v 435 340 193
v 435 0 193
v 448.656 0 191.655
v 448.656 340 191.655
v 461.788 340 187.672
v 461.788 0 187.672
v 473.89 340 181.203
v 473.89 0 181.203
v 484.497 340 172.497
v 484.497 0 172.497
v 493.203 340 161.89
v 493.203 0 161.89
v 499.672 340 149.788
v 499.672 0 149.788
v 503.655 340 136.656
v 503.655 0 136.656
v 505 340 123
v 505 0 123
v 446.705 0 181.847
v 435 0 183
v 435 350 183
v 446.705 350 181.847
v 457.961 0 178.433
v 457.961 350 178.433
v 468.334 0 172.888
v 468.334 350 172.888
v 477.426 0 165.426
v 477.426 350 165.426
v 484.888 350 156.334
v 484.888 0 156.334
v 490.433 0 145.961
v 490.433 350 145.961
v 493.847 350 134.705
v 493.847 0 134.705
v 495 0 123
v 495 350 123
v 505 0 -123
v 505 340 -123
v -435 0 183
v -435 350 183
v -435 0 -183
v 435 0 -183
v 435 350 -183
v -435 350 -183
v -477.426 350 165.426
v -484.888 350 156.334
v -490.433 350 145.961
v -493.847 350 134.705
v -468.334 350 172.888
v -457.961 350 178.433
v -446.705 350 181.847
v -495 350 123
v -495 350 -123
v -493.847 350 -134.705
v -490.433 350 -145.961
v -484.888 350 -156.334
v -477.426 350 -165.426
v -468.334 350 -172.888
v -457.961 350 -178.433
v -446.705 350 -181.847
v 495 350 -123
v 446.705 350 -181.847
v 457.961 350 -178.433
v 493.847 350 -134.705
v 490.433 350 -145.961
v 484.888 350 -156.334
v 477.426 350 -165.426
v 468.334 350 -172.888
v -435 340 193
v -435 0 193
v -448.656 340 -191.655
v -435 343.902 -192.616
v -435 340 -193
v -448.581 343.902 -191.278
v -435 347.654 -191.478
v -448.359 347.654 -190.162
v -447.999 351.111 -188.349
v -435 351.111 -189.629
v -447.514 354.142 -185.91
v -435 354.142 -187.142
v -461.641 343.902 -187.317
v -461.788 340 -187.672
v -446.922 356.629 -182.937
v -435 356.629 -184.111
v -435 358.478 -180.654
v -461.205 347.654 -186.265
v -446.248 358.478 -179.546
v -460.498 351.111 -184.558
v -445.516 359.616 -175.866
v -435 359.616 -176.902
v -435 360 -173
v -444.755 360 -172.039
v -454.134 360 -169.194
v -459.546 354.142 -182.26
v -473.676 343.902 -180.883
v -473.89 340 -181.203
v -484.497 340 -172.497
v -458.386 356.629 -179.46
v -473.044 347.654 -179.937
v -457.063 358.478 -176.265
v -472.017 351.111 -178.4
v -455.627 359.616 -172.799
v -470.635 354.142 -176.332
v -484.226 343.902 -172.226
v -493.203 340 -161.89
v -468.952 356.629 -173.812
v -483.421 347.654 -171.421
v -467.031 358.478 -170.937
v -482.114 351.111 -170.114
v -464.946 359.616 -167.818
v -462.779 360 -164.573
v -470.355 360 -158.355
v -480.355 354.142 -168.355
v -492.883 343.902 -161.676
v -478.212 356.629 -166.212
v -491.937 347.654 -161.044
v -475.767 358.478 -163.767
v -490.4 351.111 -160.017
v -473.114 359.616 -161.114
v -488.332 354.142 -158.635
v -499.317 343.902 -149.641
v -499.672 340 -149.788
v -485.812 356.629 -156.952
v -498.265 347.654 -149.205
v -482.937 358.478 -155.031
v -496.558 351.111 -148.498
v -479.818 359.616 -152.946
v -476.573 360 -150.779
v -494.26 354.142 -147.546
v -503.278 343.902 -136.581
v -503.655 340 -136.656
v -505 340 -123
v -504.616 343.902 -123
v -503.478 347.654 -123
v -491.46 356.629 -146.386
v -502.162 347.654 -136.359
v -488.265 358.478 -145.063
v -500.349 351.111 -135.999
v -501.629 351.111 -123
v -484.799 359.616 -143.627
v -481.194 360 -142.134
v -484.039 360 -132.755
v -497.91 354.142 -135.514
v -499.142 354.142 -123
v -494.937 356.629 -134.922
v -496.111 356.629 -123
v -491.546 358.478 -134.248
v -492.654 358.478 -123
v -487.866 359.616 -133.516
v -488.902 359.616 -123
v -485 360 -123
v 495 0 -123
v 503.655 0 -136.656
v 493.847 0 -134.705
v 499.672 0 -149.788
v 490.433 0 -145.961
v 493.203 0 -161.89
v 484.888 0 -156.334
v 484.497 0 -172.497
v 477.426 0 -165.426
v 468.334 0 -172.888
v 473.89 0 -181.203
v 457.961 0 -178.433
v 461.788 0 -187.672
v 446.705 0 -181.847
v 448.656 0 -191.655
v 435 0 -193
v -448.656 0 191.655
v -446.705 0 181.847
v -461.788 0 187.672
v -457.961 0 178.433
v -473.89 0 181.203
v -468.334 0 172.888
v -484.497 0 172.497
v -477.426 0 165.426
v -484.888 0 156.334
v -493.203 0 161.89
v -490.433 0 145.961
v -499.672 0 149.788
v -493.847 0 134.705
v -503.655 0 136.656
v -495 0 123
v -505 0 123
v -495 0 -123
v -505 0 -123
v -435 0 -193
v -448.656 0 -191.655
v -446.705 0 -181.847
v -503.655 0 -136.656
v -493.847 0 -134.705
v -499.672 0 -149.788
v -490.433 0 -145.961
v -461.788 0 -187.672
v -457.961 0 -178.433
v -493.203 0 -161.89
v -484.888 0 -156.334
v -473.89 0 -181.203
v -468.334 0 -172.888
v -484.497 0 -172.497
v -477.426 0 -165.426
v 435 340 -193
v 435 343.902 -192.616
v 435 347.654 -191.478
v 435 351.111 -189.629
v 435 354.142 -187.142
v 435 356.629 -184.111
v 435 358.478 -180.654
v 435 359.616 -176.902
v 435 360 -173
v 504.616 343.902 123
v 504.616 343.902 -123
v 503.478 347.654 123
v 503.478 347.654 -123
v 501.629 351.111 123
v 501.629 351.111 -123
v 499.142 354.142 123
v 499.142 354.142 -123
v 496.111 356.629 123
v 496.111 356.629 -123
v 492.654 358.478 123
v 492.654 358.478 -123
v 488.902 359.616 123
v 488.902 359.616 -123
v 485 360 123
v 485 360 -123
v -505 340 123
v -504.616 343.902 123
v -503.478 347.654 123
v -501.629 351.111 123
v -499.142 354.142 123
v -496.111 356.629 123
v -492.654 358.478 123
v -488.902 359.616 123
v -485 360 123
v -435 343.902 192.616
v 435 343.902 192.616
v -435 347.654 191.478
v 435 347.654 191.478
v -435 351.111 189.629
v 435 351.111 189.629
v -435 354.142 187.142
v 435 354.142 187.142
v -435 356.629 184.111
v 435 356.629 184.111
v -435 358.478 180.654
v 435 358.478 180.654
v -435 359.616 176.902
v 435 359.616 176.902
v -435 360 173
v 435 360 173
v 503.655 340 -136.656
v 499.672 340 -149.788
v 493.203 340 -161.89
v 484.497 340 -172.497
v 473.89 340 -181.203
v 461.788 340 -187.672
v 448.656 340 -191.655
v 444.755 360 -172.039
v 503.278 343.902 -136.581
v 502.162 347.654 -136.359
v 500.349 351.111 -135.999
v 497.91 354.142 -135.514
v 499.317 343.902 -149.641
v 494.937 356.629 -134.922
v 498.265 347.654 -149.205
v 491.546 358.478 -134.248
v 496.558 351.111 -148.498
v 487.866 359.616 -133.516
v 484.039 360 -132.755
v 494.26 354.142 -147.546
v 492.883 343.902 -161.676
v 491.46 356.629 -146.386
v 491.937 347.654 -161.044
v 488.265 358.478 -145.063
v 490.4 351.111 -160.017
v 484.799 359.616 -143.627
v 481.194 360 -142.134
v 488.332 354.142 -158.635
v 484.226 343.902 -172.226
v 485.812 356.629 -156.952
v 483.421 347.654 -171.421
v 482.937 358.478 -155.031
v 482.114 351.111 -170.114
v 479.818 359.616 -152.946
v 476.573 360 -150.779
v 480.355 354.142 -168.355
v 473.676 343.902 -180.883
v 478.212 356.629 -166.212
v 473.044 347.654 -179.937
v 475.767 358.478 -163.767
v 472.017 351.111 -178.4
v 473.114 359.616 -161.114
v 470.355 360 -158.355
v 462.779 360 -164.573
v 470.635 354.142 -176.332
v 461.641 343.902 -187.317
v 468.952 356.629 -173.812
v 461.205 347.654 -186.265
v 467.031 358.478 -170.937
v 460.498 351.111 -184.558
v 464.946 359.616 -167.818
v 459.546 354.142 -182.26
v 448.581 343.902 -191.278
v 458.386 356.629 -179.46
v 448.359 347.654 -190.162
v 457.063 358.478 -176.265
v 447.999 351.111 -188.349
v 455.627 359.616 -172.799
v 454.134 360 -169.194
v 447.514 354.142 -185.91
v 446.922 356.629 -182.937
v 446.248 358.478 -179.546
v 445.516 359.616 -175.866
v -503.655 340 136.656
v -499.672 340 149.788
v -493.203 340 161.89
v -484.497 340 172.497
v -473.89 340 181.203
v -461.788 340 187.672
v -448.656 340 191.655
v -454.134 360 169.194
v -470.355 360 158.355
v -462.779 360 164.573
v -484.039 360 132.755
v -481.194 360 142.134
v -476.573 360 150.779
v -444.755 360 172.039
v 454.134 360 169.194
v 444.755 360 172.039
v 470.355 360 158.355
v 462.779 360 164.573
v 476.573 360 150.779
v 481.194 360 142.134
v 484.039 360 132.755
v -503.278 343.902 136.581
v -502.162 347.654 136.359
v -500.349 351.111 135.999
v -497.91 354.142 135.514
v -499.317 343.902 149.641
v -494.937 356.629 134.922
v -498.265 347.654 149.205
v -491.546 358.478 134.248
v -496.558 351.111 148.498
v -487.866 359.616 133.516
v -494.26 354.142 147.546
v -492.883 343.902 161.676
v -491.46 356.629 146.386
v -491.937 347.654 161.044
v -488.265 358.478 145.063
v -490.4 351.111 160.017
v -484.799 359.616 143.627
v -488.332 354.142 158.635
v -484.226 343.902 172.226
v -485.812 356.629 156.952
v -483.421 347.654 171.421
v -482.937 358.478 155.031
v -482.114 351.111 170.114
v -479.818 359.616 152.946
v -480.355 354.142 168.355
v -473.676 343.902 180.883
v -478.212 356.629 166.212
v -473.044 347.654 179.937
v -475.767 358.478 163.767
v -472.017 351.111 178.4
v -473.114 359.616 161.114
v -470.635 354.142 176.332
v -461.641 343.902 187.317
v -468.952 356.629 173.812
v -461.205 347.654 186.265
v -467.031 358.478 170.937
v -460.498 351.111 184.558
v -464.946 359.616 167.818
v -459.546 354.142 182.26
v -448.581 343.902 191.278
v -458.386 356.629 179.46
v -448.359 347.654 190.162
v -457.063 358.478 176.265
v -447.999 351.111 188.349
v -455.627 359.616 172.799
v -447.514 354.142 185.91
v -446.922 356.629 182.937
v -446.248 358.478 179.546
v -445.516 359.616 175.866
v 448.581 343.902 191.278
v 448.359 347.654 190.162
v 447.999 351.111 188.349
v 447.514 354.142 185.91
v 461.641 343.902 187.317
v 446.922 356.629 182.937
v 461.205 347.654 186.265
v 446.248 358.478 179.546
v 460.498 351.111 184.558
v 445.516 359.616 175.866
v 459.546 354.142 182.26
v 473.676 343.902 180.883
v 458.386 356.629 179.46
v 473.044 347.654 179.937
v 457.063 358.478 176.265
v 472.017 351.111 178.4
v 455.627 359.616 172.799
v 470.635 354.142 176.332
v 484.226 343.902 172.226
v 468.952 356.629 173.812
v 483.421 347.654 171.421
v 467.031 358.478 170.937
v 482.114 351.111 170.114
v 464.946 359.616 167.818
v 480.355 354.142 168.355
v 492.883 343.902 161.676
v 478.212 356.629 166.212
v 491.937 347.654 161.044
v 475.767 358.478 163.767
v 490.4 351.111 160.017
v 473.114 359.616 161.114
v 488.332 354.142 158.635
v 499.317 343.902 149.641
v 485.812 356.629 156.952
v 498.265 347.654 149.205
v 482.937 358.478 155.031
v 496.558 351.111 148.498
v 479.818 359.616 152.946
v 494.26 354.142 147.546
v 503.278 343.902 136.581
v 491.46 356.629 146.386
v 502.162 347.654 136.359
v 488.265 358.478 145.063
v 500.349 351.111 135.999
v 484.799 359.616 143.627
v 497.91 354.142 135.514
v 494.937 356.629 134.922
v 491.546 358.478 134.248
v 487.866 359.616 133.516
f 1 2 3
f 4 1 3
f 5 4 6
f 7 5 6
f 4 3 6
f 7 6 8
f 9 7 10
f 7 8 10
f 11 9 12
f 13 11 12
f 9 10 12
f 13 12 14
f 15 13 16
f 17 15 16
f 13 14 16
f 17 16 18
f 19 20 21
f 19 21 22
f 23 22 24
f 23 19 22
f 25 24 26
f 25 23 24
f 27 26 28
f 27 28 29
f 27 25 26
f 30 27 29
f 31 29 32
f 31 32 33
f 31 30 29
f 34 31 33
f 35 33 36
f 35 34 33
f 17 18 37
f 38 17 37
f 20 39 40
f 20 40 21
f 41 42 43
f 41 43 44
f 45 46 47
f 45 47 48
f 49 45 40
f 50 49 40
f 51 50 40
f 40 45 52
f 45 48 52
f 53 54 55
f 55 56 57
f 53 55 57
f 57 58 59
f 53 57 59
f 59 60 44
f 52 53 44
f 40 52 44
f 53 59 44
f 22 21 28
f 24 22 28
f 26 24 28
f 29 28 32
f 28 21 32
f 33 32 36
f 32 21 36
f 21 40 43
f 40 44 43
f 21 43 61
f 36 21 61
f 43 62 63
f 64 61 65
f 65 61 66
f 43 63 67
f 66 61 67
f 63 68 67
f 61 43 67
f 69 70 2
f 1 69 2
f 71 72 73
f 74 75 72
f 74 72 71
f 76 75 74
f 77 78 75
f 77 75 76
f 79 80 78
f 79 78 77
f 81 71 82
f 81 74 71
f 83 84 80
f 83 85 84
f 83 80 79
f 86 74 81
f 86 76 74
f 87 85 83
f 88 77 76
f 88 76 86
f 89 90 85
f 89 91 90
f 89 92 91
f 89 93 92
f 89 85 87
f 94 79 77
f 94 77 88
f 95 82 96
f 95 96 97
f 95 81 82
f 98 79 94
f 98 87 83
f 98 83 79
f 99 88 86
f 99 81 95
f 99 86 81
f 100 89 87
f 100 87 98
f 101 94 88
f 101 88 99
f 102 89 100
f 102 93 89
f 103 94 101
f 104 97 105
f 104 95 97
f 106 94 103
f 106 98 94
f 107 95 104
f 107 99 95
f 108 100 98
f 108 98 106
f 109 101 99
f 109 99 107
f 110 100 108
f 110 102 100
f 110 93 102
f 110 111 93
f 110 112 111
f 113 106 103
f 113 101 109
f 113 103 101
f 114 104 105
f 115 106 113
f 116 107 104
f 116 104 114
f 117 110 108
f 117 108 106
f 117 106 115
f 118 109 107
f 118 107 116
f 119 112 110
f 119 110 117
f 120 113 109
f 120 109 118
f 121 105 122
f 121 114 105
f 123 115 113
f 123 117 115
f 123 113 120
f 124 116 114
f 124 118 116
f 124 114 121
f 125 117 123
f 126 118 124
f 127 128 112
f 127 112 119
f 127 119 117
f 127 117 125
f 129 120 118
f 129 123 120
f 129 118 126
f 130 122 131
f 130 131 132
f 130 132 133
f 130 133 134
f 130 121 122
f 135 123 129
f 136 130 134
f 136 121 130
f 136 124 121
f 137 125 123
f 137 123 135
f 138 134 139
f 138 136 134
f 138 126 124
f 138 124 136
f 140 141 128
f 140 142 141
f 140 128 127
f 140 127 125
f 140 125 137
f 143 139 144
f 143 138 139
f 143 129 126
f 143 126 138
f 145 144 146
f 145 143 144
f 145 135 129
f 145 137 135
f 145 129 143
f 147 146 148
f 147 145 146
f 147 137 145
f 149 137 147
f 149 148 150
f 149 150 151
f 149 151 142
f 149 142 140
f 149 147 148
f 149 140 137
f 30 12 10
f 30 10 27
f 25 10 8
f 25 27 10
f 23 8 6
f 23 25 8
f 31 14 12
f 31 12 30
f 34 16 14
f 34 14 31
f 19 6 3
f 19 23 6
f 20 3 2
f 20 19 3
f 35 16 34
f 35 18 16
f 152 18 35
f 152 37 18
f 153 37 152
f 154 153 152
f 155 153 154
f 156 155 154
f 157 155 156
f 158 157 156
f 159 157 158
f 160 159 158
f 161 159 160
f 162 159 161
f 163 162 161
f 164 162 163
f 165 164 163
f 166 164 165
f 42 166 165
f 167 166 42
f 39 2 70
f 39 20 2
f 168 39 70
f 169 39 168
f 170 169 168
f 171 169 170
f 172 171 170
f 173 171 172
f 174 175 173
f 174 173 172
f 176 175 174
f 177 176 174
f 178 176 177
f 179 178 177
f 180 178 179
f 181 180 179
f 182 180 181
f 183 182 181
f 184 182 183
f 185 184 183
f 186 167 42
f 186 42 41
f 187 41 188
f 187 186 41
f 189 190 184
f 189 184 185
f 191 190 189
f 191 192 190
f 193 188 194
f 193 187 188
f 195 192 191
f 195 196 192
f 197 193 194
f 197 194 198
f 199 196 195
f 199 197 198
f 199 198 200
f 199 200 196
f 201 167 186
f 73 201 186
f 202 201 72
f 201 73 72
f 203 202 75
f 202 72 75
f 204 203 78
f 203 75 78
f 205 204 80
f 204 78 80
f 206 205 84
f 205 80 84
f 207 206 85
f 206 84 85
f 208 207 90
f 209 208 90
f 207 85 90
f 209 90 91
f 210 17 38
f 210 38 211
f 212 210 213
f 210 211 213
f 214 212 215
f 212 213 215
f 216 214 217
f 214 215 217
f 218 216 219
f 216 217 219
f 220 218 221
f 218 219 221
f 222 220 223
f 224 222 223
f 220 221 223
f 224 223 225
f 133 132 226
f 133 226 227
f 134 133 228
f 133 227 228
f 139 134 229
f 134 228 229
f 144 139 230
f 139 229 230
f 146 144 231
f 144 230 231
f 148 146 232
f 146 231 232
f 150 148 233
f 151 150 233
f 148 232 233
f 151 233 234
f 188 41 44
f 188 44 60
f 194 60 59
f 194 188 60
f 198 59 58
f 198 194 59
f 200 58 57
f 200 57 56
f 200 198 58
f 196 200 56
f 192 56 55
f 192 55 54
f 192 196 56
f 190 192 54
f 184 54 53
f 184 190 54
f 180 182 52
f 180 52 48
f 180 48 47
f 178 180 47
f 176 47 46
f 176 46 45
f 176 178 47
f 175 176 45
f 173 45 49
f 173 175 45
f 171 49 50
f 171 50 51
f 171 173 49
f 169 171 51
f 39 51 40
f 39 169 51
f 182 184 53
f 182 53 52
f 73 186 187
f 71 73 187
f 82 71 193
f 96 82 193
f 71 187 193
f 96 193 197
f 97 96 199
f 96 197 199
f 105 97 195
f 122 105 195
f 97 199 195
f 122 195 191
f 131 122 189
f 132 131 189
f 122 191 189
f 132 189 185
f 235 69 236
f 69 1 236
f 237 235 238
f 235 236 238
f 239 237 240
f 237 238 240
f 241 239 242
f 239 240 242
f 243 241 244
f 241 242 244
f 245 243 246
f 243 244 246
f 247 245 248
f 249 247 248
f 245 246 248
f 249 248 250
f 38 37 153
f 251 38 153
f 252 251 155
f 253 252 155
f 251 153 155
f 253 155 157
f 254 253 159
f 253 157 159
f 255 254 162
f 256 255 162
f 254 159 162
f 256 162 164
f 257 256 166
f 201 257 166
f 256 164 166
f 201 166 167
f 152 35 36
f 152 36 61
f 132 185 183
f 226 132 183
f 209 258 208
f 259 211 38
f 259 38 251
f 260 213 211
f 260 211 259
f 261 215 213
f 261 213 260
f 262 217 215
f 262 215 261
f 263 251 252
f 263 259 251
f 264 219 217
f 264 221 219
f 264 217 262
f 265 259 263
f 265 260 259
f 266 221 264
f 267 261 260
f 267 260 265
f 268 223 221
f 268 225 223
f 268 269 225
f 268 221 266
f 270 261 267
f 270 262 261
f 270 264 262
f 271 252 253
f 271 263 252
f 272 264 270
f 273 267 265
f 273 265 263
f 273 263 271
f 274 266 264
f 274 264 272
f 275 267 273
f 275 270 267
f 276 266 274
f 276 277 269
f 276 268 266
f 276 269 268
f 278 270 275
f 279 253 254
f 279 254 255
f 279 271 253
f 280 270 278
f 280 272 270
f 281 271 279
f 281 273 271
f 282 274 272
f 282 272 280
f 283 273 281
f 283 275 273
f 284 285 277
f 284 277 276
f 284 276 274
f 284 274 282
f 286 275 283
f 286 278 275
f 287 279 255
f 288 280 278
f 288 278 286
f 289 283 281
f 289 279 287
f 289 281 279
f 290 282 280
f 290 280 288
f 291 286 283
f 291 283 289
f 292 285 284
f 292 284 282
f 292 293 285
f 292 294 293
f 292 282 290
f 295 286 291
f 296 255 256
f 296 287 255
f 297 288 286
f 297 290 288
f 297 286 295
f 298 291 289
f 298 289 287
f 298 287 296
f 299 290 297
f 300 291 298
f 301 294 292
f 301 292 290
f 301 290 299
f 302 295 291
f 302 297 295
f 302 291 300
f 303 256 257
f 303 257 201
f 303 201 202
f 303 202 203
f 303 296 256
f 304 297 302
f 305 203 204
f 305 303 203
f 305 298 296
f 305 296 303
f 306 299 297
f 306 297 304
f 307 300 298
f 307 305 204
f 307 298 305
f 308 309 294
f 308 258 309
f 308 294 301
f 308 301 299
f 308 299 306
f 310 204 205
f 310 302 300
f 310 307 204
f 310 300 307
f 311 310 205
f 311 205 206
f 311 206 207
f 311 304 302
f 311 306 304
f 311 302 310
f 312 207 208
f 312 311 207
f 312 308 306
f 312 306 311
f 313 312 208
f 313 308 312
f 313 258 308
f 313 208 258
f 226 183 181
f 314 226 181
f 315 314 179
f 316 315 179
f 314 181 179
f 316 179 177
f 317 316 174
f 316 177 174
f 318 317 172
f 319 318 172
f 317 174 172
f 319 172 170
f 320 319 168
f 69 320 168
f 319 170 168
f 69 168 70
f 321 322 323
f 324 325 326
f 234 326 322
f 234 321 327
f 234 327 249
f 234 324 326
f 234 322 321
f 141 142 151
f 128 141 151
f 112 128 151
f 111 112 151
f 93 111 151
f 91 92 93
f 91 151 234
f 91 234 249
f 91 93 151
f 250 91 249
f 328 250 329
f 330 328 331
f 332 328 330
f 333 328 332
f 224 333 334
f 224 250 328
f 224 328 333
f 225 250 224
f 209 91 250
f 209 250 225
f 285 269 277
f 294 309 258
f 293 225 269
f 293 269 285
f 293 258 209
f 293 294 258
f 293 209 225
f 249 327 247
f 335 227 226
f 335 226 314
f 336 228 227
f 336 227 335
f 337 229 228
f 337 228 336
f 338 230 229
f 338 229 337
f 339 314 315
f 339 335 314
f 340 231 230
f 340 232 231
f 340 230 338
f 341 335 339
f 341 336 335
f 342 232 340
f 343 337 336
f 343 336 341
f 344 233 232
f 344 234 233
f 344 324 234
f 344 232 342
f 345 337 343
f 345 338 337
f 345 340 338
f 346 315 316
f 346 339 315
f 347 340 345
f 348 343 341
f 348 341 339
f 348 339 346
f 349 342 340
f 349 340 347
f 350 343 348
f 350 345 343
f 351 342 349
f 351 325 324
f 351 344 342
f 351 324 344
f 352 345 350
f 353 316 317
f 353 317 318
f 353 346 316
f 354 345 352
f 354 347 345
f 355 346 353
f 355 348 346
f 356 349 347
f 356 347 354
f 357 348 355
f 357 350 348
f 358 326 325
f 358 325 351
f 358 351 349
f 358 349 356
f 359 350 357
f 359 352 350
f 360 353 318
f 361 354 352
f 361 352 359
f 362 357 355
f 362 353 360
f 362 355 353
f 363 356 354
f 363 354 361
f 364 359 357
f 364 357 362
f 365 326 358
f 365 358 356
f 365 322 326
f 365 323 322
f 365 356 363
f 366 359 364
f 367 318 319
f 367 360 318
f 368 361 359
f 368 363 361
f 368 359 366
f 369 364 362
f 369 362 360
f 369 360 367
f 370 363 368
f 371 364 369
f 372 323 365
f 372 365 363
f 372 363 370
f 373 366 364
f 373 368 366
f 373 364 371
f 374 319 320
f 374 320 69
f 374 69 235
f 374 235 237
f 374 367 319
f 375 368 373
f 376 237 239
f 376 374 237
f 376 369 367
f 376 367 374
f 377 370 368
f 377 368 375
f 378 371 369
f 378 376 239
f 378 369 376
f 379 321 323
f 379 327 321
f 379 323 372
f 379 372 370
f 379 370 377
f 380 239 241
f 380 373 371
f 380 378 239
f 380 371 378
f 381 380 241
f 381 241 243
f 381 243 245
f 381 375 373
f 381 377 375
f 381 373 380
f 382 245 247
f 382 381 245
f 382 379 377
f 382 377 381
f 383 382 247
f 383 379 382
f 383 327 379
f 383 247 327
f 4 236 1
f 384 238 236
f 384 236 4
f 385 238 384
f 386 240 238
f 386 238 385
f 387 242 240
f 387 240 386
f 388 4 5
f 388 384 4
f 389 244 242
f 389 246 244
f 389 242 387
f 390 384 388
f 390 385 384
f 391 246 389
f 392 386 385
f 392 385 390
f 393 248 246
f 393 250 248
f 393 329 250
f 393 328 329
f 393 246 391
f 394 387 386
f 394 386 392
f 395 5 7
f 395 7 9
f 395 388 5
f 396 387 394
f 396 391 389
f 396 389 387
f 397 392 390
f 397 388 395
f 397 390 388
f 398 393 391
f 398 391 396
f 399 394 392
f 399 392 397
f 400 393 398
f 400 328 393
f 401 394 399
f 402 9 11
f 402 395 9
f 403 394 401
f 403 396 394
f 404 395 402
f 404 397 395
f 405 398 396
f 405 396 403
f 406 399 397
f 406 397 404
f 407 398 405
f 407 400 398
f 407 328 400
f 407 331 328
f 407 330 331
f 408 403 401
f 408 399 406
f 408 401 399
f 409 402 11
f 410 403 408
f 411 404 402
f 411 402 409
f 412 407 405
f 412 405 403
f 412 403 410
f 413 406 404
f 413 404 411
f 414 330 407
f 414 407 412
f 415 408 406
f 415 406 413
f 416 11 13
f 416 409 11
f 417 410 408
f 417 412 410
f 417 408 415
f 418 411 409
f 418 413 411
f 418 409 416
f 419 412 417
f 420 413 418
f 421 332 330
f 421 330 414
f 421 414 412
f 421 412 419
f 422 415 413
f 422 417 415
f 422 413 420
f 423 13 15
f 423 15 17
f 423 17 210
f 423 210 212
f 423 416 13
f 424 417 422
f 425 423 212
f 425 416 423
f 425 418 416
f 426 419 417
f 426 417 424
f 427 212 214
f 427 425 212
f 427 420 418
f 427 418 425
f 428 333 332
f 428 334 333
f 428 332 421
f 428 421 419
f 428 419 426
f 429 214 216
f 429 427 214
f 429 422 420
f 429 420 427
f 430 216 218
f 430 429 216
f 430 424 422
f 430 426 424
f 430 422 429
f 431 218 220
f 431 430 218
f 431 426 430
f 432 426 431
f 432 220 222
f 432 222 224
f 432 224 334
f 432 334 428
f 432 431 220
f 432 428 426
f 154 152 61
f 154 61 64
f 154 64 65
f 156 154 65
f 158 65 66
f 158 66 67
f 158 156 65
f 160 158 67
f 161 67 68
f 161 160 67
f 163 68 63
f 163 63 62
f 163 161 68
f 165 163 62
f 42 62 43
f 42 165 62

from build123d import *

# Parameters (mm, degrees)
BOSS_EXTRUDE1_DEPTH = 350
BOSS_EXTRUDE2_DEPTH = 10
FILLET1_R           = 20


with BuildPart() as part:
    # Sketch1 → Boss-Extrude1 (new body)
    with BuildSketch(Plane(origin=(0, 0, 0), x_dir=(1, 0, 0), z_dir=(0, 1, 0))):
        with BuildLine():
            Line((-505, -123), (-505, 123))
            ThreePointArc((-505, 123), (-484.497474683, 172.497474683), (-435, 193))
            Line((-435, 193), (435, 193))
            ThreePointArc((435, 193), (484.497474683, 172.497474683), (505, 123))
            Line((505, 123), (505, -123))
            ThreePointArc((505, -123), (484.497474683, -172.497474683), (435, -193))
            Line((435, -193), (-435, -193))
            ThreePointArc((-435, -193), (-484.497474683, -172.497474683), (-505, -123))
        make_face()
        with BuildLine():
            ThreePointArc((495, 123), (477.426406871, 165.426406871), (435, 183))
            Line((435, 183), (-435, 183))
            ThreePointArc((-435, 183), (-477.426406871, 165.426406871), (-495, 123))
            Line((-495, 123), (-495, -123))
            ThreePointArc((-495, -123), (-477.426406871, -165.426406871), (-435, -183))
            Line((-435, -183), (435, -183))
            ThreePointArc((435, -183), (477.426406871, -165.426406871), (495, -123))
            Line((495, -123), (495, 123))
        make_face(mode=Mode.SUBTRACT)
    extrude(amount=BOSS_EXTRUDE1_DEPTH)

    # Sketch2 → Boss-Extrude2 (add)
    with BuildSketch(Plane(origin=(0, 350, 0), x_dir=(1, 0, 0), z_dir=(0, 1, 0))):
        with BuildLine():
            Line((-435, -193), (435, -193))
            ThreePointArc((435, -193), (484.497474683, -172.497474683), (505, -123))
            Line((505, -123), (505, 123))
            ThreePointArc((505, 123), (484.497474683, 172.497474683), (435, 193))
            Line((435, 193), (-435, 193))
            ThreePointArc((-435, 193), (-484.497474683, 172.497474683), (-505, 123))
            Line((-505, 123), (-505, -123))
            ThreePointArc((-505, -123), (-484.497474683, -172.497474683), (-435, -193))
        make_face()
    extrude(amount=BOSS_EXTRUDE2_DEPTH)

    # Fillet1
    fillet1_edges = [part.edges().sort_by_distance(p)[0] for p in [
        (484.497474683, 360, -172.497474683),
        (0, 360, -193),
        (-484.497474683, 360, -172.497474683),
        (-505, 360, 0),
        (-484.497474683, 360, 172.497474683),
        (0, 360, 193),
        (484.497474683, 360, 172.497474683),
        (505, 360, 0),
    ]]
    fillet(fillet1_edges, radius=FILLET1_R)


solid = part.part
